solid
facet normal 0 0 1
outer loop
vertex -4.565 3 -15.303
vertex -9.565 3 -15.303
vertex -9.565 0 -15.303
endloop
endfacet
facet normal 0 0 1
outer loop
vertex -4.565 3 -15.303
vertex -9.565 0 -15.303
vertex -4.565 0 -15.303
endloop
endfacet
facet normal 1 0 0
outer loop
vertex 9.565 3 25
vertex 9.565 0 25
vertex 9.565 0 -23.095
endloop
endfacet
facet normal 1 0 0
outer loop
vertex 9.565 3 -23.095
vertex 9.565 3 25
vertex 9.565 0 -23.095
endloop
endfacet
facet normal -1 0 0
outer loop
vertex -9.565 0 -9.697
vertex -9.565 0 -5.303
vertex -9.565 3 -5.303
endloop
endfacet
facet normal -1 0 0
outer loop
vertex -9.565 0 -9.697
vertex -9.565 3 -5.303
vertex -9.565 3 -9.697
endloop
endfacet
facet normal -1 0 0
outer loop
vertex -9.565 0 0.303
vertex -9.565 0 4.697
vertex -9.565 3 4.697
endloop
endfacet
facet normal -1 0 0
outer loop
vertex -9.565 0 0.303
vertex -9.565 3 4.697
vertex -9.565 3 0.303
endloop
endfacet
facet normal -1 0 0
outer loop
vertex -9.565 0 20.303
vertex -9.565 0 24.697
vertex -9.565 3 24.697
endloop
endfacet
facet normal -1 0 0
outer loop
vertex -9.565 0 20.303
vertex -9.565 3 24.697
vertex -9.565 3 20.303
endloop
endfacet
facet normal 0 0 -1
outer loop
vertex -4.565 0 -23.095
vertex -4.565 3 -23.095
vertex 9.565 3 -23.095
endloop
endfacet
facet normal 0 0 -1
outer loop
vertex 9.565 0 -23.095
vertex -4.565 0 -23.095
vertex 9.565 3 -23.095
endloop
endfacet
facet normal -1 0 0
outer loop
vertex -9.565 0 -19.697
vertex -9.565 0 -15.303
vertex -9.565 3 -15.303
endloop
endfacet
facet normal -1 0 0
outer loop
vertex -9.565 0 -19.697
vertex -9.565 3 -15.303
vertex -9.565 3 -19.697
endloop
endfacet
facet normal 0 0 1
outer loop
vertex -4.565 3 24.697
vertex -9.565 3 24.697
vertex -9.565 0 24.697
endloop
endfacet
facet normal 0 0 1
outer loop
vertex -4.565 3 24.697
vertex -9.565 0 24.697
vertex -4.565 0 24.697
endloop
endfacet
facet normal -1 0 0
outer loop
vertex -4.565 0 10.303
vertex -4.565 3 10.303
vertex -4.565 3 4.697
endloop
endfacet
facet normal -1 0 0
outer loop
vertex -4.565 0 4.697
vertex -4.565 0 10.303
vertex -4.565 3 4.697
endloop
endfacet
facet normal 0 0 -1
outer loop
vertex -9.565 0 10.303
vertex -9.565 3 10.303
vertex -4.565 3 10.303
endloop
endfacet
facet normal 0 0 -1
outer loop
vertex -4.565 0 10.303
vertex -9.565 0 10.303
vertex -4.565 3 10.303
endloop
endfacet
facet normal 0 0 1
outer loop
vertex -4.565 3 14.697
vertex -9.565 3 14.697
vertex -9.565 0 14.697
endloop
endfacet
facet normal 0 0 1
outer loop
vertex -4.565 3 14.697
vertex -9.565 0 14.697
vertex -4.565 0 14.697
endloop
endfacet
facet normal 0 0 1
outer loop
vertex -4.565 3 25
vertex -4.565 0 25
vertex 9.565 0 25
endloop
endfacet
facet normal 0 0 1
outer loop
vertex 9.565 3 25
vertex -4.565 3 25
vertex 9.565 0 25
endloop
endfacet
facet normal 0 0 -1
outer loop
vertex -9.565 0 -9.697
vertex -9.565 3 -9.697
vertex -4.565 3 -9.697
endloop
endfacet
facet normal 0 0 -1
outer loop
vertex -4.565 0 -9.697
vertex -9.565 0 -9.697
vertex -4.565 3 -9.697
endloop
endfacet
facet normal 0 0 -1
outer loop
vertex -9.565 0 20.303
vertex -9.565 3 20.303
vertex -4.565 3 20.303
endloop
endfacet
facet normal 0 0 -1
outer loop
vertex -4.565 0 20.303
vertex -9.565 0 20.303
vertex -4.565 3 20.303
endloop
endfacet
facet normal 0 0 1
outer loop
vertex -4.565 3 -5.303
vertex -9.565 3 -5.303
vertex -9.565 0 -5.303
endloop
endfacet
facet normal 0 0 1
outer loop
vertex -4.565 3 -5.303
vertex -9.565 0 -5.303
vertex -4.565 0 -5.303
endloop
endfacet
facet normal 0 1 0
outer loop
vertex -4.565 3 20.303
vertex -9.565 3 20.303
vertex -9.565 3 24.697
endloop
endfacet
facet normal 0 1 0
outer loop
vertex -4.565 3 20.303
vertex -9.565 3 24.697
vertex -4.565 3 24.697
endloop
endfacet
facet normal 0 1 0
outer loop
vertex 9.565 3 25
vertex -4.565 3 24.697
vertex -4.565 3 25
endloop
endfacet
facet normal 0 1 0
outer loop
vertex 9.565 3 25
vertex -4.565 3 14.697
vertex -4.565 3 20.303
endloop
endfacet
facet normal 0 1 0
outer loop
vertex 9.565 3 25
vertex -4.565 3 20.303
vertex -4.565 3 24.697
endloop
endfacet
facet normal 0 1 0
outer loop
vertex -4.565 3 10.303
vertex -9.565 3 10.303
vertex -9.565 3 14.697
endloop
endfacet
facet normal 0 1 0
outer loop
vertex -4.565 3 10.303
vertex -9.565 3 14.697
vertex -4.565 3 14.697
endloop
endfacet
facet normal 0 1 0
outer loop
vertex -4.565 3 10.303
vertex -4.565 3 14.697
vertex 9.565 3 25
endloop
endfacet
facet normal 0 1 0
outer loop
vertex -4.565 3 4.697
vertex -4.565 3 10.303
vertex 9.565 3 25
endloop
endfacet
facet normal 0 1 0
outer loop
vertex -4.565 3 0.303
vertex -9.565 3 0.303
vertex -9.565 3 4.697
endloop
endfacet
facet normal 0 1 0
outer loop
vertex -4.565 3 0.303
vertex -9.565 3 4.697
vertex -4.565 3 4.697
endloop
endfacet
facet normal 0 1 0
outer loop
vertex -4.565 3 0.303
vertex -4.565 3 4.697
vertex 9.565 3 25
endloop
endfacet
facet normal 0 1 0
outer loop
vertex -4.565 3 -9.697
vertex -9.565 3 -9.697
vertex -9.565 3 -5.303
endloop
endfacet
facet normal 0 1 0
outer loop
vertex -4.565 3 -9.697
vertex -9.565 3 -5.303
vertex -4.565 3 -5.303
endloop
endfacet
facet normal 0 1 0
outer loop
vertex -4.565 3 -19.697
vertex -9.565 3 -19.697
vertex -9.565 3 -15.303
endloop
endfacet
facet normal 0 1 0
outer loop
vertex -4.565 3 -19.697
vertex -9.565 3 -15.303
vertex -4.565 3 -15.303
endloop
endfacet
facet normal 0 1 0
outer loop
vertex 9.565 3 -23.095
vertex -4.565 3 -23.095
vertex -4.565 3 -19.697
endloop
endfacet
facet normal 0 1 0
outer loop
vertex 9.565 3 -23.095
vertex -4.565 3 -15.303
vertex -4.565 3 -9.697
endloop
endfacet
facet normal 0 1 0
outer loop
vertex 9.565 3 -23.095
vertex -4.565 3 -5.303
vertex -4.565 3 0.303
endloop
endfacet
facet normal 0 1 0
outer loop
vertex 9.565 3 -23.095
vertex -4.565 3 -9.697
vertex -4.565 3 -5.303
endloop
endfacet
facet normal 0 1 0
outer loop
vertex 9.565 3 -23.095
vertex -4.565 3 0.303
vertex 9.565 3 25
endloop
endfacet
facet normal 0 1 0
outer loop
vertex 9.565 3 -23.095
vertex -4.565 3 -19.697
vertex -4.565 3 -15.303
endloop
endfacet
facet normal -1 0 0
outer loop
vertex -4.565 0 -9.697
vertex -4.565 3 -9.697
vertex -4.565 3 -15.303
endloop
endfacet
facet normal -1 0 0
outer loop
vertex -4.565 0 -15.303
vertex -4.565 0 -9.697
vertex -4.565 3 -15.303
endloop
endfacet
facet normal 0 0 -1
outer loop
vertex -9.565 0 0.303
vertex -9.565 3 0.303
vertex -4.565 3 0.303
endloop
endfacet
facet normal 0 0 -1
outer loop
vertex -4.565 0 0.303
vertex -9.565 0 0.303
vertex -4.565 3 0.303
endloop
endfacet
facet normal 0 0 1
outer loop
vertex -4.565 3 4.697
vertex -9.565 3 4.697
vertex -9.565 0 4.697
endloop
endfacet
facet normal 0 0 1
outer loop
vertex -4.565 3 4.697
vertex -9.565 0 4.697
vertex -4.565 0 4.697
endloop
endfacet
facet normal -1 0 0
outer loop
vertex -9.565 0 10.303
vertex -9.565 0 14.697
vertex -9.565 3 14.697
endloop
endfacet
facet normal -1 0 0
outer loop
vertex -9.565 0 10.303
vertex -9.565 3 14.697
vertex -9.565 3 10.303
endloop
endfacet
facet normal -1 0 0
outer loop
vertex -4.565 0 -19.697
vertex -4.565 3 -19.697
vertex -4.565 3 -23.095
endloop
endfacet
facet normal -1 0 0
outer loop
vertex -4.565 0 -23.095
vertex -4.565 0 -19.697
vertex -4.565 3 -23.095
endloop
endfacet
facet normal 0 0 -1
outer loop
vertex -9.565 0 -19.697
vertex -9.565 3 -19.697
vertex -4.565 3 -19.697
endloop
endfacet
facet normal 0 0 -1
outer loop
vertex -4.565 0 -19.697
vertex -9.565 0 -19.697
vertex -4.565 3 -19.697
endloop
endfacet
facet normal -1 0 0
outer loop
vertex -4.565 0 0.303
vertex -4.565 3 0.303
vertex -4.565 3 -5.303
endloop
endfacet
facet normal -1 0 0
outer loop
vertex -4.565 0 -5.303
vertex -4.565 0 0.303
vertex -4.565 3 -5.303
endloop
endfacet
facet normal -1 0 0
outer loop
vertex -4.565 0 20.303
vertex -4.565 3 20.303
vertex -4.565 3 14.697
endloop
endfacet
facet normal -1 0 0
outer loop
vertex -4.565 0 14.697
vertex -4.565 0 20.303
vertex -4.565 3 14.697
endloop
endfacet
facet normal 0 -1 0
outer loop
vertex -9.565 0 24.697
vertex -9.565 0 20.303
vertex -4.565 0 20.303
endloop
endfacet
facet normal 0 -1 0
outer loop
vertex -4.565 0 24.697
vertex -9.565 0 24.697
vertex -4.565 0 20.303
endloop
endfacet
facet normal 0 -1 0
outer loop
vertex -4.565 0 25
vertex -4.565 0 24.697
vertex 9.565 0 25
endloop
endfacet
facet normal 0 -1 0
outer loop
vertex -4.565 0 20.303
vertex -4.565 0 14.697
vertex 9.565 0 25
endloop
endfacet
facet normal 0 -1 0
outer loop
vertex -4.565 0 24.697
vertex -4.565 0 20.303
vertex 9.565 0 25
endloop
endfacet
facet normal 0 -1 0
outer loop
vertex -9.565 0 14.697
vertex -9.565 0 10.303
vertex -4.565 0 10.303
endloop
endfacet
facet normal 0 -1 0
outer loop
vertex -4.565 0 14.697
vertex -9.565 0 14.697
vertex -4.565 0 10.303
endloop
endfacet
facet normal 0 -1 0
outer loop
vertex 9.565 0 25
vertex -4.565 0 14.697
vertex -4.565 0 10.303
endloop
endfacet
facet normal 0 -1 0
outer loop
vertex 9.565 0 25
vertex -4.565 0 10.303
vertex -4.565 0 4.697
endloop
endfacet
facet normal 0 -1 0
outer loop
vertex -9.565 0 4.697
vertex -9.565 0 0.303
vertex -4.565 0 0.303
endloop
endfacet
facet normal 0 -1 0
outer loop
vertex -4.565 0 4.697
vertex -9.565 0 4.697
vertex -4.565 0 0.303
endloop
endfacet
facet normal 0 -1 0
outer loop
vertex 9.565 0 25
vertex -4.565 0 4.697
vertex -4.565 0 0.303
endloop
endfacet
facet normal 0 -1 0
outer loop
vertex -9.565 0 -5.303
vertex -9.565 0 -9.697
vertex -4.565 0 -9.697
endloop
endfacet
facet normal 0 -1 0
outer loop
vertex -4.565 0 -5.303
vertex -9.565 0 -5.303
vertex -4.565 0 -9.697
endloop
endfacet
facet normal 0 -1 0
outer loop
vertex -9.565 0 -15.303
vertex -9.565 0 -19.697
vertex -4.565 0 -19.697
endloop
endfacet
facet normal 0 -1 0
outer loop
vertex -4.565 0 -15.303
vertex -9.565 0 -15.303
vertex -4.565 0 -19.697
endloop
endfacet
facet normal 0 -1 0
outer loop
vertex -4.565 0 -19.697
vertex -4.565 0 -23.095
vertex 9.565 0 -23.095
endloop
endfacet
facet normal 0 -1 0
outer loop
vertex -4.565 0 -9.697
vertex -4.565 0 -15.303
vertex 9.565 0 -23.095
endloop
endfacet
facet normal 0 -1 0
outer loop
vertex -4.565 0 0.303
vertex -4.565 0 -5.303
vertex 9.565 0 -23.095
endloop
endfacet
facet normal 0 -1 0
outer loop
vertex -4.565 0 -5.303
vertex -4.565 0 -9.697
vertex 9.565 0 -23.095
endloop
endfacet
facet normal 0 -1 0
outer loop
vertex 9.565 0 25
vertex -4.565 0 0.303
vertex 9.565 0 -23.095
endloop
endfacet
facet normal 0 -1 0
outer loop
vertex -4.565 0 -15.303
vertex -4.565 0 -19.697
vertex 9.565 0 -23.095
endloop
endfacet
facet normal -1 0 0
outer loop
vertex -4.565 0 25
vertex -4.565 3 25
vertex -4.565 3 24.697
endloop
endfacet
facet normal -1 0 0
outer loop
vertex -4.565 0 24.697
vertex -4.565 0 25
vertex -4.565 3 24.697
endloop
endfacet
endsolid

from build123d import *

# Parameters (mm, degrees)
SKETCH_1_W          = 19.1304083
SKETCH_1_H          = 50
EXTRUDE_1_DEPTH     = 3
SKETCH_2_W          = 5
SKETCH_2_H          = 5
CUT_EXTRUDE_1_DEPTH = 3
SKETCH_3_W          = 18.086961025
SKETCH_3_H          = 4.686767273
CUT_EXTRUDE_2_DEPTH = 3
SKETCH_4_W          = 5
SKETCH_4_H          = 0.605391548
CUT_EXTRUDE_3_DEPTH = 10


with BuildPart() as part:
    # 草图1 → 凸台-拉伸1 (new body)
    with BuildSketch(Plane(origin=(0, 0, 0), x_dir=(1, 0, 0), z_dir=(0, 1, 0))):
        Rectangle(SKETCH_1_W, SKETCH_1_H)
    extrude(amount=EXTRUDE_1_DEPTH)

    # 草图2 → 切除-拉伸1 (cut)
    with BuildSketch(Plane(origin=(0, 3, 0), x_dir=(1, 0, 0), z_dir=(0, 1, 0))):
        with Locations((-7.06520415, 12.5)):
            Rectangle(SKETCH_2_W, SKETCH_2_H)
        with Locations((-7.06520415, 22.5)):
            Rectangle(SKETCH_2_W, SKETCH_2_H)
        with Locations((-7.06520415, 2.5)):
            Rectangle(SKETCH_2_W, SKETCH_2_H)
        with Locations((-7.06520415, -7.5)):
            Rectangle(SKETCH_2_W, SKETCH_2_H)
        with Locations((-7.06520415, -17.5)):
            Rectangle(SKETCH_2_W, SKETCH_2_H)
    extrude(amount=-CUT_EXTRUDE_1_DEPTH, mode=Mode.SUBTRACT)

    # 草图3 → 切除-拉伸2 (cut)
    with BuildSketch(Plane(origin=(0, 3, 0), x_dir=(1, 0, 0), z_dir=(0, 1, 0))):
        with Locations((3.01992157, 25.438245622)):
            Rectangle(SKETCH_3_W, SKETCH_3_H)
    extrude(amount=-CUT_EXTRUDE_2_DEPTH, mode=Mode.SUBTRACT)

    # 草图4 → 切除-拉伸3 (cut)
    with BuildSketch(Plane(origin=(0, 3, 0), x_dir=(1, 0, 0), z_dir=(0, 1, 0))):
        with Locations((-7.06520415, 20)):
            Rectangle(SKETCH_4_W, SKETCH_4_H)
        with Locations((-7.06520415, 15)):
            Rectangle(SKETCH_4_W, SKETCH_4_H)
        with Locations((-7.06520415, 5)):
            Rectangle(SKETCH_4_W, SKETCH_4_H)
        with Locations((-7.06520415, 10)):
            Rectangle(SKETCH_4_W, SKETCH_4_H)
        with Locations((-7.06520415, -5)):
            Rectangle(SKETCH_4_W, SKETCH_4_H)
        with Locations((-7.06520415, 0)):
            Rectangle(SKETCH_4_W, SKETCH_4_H)
        with Locations((-7.06520415, -15)):
            Rectangle(SKETCH_4_W, SKETCH_4_H)
        with Locations((-7.06520415, -10)):
            Rectangle(SKETCH_4_W, SKETCH_4_H)
        with Locations((-7.06520415, -25)):
            Rectangle(SKETCH_4_W, SKETCH_4_H)
        with Locations((-7.06520415, -20)):
            Rectangle(SKETCH_4_W, SKETCH_4_H)
    extrude(amount=-CUT_EXTRUDE_3_DEPTH, mode=Mode.SUBTRACT)


solid = part.part
